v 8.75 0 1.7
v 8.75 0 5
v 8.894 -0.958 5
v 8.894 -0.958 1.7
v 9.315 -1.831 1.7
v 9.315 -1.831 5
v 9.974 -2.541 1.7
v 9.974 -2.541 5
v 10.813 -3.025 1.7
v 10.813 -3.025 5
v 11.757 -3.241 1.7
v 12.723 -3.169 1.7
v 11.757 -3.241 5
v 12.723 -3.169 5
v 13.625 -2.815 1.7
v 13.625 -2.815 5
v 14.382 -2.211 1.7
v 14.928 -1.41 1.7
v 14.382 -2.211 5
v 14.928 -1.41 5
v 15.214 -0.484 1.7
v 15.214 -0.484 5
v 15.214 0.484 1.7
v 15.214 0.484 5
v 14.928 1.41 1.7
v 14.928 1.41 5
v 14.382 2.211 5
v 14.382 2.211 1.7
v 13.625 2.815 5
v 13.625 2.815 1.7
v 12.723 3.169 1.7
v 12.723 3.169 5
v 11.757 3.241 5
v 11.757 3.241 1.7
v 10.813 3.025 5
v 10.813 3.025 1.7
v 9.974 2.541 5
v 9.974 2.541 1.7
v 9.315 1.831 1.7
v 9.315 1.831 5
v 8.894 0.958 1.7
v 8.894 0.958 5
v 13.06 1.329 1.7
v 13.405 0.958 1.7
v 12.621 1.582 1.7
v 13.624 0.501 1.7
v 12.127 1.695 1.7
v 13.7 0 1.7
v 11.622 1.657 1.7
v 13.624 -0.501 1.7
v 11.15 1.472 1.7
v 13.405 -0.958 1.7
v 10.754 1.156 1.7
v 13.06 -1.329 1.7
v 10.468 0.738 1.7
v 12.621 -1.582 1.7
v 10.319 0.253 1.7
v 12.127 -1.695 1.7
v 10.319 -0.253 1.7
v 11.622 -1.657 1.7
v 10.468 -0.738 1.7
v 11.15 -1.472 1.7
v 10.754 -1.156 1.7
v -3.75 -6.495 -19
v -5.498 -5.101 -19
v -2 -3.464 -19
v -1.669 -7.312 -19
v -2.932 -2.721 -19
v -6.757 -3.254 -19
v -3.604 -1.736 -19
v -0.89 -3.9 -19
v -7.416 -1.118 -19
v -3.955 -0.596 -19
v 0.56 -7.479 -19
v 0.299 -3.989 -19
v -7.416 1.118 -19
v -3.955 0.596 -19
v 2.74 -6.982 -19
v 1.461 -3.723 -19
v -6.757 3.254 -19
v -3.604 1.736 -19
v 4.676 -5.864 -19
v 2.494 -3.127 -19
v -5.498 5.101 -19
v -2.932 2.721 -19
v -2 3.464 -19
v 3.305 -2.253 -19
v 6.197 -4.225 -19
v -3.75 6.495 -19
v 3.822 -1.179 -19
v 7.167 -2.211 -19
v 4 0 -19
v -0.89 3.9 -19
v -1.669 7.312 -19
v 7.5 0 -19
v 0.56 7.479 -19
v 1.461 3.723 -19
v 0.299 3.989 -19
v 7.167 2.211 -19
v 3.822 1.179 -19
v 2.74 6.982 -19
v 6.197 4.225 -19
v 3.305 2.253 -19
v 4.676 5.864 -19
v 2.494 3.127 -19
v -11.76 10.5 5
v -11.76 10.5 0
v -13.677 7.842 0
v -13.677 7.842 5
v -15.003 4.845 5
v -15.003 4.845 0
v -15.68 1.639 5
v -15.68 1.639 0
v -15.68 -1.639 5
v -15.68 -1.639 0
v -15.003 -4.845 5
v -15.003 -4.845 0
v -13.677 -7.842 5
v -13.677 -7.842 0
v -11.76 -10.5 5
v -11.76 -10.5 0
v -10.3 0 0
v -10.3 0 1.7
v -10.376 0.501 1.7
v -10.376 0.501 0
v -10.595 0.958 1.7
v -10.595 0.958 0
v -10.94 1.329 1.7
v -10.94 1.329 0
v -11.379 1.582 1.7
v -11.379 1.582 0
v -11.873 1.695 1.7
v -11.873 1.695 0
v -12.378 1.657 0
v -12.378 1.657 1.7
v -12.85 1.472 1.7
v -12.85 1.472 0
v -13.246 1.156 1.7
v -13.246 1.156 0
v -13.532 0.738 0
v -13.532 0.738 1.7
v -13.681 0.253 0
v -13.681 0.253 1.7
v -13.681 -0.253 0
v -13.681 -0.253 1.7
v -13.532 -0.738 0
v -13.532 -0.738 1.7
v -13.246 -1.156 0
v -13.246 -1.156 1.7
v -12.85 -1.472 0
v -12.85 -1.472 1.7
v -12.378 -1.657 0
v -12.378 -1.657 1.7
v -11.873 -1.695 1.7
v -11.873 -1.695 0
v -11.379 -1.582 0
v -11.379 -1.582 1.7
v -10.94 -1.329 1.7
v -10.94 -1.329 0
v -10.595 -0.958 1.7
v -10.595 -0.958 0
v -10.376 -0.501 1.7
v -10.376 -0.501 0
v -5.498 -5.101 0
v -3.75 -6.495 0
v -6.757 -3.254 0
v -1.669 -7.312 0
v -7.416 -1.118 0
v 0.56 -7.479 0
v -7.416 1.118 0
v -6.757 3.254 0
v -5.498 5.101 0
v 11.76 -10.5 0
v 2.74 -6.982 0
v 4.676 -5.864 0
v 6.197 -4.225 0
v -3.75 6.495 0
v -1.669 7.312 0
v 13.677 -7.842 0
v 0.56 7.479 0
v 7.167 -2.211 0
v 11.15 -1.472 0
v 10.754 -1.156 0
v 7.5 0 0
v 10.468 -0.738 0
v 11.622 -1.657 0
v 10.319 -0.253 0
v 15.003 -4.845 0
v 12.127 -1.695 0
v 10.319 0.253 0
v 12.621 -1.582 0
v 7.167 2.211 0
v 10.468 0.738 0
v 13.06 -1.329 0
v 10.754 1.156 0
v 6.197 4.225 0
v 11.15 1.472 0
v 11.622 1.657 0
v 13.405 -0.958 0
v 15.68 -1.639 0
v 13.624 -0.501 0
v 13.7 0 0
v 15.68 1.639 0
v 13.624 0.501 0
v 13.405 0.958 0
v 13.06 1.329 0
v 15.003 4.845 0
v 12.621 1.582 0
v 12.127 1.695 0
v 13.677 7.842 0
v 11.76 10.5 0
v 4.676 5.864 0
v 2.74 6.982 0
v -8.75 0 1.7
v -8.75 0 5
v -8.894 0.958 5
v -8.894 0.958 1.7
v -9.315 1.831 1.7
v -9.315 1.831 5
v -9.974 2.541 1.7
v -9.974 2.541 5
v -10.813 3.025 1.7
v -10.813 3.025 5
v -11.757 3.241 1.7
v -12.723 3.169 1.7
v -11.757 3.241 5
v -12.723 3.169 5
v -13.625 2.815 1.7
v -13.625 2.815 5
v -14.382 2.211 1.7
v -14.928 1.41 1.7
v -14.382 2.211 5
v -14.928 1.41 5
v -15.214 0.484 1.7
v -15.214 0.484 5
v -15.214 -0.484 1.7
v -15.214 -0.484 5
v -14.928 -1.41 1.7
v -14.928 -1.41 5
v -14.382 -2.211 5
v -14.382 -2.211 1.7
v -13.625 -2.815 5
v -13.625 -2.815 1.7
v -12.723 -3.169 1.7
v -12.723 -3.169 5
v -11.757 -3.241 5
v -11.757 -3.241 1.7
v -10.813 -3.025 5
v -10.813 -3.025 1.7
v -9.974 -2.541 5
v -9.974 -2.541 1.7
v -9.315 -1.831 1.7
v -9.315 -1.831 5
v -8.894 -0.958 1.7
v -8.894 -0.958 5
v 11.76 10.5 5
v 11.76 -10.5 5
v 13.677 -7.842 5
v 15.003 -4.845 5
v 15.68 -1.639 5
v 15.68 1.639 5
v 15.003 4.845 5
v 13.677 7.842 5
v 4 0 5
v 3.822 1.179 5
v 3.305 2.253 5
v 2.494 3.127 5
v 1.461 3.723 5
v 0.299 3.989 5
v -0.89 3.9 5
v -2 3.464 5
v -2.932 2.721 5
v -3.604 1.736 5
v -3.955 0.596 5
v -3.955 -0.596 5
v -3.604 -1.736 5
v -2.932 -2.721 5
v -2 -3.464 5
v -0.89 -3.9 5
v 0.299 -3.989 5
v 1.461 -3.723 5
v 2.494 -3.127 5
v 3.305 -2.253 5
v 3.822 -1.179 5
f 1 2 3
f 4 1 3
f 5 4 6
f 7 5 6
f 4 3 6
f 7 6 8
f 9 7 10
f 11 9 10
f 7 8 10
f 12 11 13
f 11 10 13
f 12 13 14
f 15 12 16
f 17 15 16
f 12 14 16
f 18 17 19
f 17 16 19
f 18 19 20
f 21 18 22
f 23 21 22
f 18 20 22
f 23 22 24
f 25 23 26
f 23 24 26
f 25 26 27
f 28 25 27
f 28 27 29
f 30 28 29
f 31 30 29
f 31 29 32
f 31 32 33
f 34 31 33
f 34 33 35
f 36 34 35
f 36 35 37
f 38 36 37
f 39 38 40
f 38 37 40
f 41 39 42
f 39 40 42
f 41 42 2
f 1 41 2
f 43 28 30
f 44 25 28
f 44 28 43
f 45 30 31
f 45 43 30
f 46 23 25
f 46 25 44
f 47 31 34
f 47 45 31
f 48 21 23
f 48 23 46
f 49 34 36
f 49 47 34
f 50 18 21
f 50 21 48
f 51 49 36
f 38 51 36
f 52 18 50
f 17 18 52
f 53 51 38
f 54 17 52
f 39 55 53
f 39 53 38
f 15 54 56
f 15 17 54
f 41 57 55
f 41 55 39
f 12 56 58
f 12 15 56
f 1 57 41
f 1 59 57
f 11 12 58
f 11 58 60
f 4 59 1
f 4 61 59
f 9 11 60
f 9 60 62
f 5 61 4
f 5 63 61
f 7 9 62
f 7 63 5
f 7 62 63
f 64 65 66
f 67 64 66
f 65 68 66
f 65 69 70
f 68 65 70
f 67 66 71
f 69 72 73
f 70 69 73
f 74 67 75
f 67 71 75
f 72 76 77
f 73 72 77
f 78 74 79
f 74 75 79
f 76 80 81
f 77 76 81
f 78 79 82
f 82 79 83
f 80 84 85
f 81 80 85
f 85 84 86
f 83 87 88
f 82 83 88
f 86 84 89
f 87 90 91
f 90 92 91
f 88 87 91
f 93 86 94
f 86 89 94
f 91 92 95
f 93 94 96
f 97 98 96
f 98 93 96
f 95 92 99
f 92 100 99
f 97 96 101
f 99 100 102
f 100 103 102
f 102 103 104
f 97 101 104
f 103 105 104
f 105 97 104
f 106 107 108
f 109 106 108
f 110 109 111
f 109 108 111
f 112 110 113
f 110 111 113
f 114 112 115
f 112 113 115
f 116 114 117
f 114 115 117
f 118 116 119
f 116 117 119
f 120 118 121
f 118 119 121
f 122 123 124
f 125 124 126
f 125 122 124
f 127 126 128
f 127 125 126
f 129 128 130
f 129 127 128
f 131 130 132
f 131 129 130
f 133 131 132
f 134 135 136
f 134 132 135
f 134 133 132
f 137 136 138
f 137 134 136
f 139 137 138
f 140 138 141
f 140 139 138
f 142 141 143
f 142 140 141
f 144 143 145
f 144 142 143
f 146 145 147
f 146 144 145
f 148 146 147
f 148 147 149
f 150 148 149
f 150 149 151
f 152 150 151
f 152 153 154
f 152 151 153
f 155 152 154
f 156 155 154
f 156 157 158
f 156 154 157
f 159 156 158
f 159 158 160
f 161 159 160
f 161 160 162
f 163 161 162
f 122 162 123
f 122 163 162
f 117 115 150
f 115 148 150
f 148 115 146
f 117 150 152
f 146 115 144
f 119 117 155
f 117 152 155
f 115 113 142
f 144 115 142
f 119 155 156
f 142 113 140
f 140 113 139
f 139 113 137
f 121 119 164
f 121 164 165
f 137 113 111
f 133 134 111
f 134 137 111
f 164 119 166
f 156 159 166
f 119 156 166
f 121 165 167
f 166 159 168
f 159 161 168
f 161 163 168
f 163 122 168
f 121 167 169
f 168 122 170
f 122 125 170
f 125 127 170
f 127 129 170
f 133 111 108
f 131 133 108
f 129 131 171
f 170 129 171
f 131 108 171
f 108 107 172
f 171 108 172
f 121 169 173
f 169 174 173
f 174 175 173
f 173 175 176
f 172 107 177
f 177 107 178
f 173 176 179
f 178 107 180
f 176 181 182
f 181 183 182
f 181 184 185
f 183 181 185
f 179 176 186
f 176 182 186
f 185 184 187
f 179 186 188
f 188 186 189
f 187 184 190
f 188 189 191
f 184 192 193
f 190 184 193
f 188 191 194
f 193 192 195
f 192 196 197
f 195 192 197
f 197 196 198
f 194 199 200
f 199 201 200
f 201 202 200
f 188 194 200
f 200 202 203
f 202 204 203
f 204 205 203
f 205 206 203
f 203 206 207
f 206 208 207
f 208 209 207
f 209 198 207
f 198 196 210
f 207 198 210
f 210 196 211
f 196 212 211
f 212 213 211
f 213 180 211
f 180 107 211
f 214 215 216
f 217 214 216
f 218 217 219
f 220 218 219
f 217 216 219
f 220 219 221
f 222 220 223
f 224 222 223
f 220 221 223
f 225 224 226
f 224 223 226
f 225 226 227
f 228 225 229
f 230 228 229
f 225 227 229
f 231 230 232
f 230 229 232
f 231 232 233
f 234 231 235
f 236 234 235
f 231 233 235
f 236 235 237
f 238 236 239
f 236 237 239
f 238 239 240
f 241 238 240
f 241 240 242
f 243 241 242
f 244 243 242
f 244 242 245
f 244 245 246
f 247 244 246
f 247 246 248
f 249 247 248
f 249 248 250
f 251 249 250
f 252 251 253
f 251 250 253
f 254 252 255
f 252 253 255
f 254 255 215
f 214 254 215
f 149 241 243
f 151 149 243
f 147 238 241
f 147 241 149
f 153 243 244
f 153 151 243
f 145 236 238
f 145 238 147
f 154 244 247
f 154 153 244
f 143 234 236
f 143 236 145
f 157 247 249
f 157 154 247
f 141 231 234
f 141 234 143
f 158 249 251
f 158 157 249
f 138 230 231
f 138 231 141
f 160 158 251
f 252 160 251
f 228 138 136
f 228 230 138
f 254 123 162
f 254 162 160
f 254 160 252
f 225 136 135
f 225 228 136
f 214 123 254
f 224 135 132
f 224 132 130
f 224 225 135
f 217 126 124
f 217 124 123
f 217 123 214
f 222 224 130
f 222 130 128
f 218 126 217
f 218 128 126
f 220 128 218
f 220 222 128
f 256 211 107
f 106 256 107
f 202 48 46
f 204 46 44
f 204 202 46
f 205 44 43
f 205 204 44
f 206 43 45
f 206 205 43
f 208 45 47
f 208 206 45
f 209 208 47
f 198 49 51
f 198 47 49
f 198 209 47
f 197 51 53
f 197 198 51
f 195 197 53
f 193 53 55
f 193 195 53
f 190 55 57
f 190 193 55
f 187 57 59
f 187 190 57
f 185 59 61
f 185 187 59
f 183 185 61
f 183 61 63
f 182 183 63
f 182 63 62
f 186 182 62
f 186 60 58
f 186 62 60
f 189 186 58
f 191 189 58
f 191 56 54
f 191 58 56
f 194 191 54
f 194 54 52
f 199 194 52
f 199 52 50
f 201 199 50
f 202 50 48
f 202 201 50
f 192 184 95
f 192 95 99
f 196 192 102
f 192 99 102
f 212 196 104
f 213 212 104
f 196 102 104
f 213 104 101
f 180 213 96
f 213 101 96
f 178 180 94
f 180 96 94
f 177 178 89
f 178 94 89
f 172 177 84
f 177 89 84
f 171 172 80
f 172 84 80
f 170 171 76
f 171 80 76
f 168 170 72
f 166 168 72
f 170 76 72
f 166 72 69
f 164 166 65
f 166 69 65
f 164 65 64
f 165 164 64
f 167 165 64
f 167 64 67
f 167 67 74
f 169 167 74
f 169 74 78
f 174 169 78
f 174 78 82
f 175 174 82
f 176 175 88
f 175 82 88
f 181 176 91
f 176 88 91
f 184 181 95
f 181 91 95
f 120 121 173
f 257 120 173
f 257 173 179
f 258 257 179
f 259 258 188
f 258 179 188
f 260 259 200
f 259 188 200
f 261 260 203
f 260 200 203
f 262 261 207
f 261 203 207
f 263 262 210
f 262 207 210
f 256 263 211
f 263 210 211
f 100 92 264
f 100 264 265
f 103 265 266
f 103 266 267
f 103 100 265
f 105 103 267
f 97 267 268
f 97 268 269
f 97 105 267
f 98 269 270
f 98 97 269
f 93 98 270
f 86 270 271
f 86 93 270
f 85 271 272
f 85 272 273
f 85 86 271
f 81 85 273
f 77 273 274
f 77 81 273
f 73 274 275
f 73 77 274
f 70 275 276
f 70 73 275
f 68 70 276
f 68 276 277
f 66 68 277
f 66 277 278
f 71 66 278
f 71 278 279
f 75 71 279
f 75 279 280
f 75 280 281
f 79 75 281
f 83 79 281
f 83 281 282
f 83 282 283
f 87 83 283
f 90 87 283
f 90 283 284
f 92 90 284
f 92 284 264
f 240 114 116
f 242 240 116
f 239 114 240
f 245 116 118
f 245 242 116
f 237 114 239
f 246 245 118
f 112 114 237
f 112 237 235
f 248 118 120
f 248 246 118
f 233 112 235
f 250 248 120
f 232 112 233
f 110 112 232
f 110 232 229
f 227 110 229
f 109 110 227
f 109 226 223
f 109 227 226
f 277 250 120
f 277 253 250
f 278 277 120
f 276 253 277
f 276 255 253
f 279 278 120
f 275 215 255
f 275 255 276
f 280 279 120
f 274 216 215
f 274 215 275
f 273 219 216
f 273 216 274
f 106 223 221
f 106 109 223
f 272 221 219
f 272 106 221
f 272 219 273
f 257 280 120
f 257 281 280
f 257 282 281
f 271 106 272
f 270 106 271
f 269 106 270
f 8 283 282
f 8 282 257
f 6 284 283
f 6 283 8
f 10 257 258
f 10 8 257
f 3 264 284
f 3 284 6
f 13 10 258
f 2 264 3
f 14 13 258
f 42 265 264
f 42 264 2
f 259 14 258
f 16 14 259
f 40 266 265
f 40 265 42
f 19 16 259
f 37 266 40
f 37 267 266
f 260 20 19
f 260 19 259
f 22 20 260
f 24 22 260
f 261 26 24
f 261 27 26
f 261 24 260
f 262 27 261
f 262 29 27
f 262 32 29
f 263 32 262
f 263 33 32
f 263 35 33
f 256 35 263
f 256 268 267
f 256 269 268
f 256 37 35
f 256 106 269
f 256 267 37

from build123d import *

# Parameters (mm, degrees)
SKETCH1_R           = 1.7
SKETCH1_R_2         = 4
BOSS_EXTRUDE1_DEPTH = 5
BOSS_EXTRUDE2_START = -19
SKETCH1_3_R         = 7.5
SKETCH1_3_R_2       = 4
BOSS_EXTRUDE2_DEPTH = 19
SKETCH2_R           = 3.25
CUT_EXTRUDE1_DEPTH  = 3.3


with BuildPart() as part:
    # Sketch1 → Boss-Extrude1 (new body)
    with BuildSketch(Plane.XY):
        with BuildLine():
            Line((11.760078621, 10.5), (-11.760078621, 10.5))
            ThreePointArc((-11.760078621, 10.5), (-15.765451125, 0), (-11.760078621, -10.5))
            Line((-11.760078621, -10.5), (11.760078621, -10.5))
            ThreePointArc((11.760078621, -10.5), (15.765451125, 0), (11.760078621, 10.5))
        make_face()
        with Locations((-12, 0)):
            Circle(SKETCH1_R, mode=Mode.SUBTRACT)
        with Locations((12, 0)):
            Circle(SKETCH1_R, mode=Mode.SUBTRACT)
        Circle(SKETCH1_R_2, mode=Mode.SUBTRACT)
    extrude(amount=BOSS_EXTRUDE1_DEPTH)

    # Sketch1<3> → Boss-Extrude2 (add)
    with BuildSketch(Plane.XY.offset(BOSS_EXTRUDE2_START)):
        Circle(SKETCH1_3_R)
        Circle(SKETCH1_3_R_2, mode=Mode.SUBTRACT)
    extrude(amount=BOSS_EXTRUDE2_DEPTH)

    # Sketch2 → Cut-Extrude1 (cut)
    with BuildSketch(Plane.XY.offset(5)):
        with Locations((-12, 0)):
            Circle(SKETCH2_R)
        with Locations((12, 0)):
            Circle(SKETCH2_R)
    extrude(amount=-CUT_EXTRUDE1_DEPTH, mode=Mode.SUBTRACT)


solid = part.part
